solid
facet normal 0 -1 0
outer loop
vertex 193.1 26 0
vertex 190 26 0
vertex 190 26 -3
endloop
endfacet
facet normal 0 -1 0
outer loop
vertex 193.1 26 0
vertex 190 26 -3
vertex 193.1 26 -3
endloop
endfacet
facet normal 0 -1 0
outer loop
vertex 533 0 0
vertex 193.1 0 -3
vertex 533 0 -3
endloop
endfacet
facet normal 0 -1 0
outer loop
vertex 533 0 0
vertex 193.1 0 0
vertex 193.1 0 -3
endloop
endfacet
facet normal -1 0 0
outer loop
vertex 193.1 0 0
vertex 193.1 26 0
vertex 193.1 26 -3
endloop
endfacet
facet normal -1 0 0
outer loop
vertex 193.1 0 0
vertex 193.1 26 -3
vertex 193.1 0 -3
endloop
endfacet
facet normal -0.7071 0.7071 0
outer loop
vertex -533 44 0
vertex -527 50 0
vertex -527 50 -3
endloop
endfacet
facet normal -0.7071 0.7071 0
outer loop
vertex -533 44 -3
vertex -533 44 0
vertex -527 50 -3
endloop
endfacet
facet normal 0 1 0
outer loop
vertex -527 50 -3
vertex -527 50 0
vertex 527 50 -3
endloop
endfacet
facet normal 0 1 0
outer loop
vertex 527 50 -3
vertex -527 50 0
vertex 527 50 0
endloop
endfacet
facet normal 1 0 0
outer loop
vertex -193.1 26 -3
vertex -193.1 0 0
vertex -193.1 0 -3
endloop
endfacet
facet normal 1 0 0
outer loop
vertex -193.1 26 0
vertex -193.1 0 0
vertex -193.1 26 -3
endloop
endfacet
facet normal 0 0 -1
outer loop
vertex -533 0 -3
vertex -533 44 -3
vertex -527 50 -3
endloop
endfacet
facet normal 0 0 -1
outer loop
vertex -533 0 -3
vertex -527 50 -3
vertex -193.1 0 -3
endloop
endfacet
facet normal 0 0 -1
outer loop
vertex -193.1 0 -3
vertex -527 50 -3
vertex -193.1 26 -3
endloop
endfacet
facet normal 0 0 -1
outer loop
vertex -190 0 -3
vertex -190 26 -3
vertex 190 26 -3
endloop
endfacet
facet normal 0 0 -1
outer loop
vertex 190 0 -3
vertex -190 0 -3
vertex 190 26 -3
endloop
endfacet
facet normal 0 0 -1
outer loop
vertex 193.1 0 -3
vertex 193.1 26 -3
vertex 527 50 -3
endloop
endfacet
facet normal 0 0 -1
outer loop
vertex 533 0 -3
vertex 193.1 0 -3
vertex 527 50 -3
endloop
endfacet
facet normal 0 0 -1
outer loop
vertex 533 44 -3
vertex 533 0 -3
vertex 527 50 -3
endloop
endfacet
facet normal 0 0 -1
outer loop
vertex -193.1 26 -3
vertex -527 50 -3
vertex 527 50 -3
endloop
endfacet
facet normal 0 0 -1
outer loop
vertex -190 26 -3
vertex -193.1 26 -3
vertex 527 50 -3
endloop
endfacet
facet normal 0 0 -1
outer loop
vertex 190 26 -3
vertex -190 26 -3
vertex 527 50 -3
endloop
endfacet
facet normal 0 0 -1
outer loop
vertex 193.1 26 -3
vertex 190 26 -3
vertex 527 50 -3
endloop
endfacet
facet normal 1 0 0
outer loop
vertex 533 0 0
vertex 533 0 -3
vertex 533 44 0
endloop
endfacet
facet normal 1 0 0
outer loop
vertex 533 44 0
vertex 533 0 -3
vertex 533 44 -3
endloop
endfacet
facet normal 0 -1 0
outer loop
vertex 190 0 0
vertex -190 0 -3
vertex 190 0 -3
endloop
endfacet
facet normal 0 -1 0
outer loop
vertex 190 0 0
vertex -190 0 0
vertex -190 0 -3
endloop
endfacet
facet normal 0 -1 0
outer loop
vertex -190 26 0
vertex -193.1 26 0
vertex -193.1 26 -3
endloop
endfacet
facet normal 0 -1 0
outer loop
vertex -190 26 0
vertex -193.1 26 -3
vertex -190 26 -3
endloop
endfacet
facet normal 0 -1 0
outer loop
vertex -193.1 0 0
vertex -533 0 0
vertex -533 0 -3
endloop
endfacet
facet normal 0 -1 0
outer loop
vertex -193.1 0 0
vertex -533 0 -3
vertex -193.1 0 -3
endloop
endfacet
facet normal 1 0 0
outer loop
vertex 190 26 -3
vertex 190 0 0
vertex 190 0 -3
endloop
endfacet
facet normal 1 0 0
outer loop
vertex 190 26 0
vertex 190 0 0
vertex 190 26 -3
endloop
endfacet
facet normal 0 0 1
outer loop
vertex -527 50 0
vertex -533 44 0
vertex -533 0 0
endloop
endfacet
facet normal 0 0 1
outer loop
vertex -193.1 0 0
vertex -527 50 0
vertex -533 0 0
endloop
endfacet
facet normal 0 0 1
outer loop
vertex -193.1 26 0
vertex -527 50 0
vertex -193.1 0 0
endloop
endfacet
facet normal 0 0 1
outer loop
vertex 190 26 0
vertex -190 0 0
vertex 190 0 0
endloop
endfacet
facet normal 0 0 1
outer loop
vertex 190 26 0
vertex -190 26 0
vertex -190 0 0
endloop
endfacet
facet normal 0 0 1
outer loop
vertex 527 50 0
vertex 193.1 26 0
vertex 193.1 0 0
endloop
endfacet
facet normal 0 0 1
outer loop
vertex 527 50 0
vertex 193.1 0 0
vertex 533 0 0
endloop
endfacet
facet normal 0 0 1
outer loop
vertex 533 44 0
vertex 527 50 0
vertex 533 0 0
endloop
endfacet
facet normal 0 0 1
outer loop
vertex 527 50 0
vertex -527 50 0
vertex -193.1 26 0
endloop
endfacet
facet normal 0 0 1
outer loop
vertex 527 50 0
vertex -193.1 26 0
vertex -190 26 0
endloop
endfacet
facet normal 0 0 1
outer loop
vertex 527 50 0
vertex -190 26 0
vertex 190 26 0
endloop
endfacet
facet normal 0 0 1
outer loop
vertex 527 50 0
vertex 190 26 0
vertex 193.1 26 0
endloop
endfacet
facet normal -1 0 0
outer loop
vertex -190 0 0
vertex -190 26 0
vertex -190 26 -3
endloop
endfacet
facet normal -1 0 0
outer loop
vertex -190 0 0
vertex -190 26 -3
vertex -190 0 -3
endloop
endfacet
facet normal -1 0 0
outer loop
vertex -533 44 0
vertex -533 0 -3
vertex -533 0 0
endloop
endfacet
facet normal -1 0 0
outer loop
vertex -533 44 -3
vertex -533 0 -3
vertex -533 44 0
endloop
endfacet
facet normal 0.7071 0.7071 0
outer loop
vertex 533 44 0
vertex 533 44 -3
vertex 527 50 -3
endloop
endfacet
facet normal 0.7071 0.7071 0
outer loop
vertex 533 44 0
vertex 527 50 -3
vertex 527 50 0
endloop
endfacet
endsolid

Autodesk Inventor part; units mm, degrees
ref_plane "YZ Plane" through (0, 0, 0) normal (1, 0, 0) x (0, 1, 0)
ref_plane "XZ Plane" through (0, 0, 0) normal (0, 1, 0) x (-1, 0, 0)
ref_plane "XY Plane" through (0, 0, 0) normal (0, 0, 1) x (1, 0, 0)
sketch "Sketch1" plane through (0, 0, 0) normal (0, 0, 1) x (1, 0, 0)
  line L0 (-600, 0) -> (600, 0)
  line L1 (-600, 0) -> (-600, 50)
  line L2 (-600, 50) -> (600, 50)
  line L3 (600, 50) -> (600, 0)
  circle A0 centre (-600, 0) radius 25
  circle A1 centre (600, 0) radius 25
  line L4 (600, 0) -> (644.2345, 16.1001)
  line L5 (644.2345, 16.1001) -> (635, 50)
  line L6 (635, 50) -> (600, 50)
  point P0 (0, 0)
  point P1 (0, 0)
  point P2 (-600, 25)
  point P3 (-575, 0)
  point P4 (575, 0)
  point P5 (600, 25)
  point P6 (623.4923, 8.5505)
  dimension "d18" = 50
  dimension "d19" = 1200
  dimension "d25" = 50
  dimension "d26" = 50
  dimension "d39" = 70
  dimension "d40" = 35
extrude "Plate2" add sketch "Sketch1" against normal blind 3 contours L1 A0 L0 | A0 L1 L2 L3 A1 L0 | A1 L3 L0 picked at (-598.1457, 16.4577)
sketch "Sketch3" plane through (0, 0, 0) normal (0, 0, 1) x (1, 0, 0)
  line L0 (-191.55, 0) -> (-191.55, 50) construction
  line L1 (600, 50) -> (-600, 50) construction
  line L2 (-600, 50) -> (-600, 0) projected
  line L3 (-193.1, 26) -> (-190, 26)
  line L4 (-190, 26) -> (-190, 0)
  line L5 (-190, 0) -> (-193.1, 0)
  line L6 (-193.1, 0) -> (-193.1, 26)
  line L7 (-600, 0) -> (600, 0) projected
  line L8 (191.55, 50) -> (191.55, 0) construction
  line L9 (190, 26) -> (193.1, 26)
  line L10 (193.1, 26) -> (193.1, 0)
  line L11 (193.1, 0) -> (190, 0)
  line L12 (190, 0) -> (190, 26)
  line L13 (0, 0) -> (0, 50) construction
  point P0 (0, 0)
  point P1 (190, 0)
  point P2 (193.1, 0)
  dimension "d28" = 3.1
  dimension "d29" = 26
  dimension "d52" = 380
extrude "Extrusion2" cut sketch "Sketch3" against normal through all
sketch "Sketch4" plane through (0, 0, -3) normal (0, 0, -1) x (-1, 0, 0)
  line L0 (190, 0) -> (190, 26) projected
  line L1 (190, 26) -> (193.1, 26) projected
  line L2 (193.1, 26) -> (193.1, 0) projected
  line L3 (600, 0) -> (193.1, 0) projected
  line L4 (600, 50) -> (600, 0) projected
  line L5 (-600, 50) -> (600, 50) projected
  line L6 (-600, 0) -> (-600, 50) projected
  line L7 (-193.1, 0) -> (-600, 0) projected
  line L8 (-193.1, 0) -> (-193.1, 26) projected
  line L9 (-193.1, 26) -> (-190, 26) projected
  line L10 (-190, 26) -> (-190, 0) projected
  line L11 (190, 0) -> (-190, 0) projected
  line L12 (-533, 0) -> (-533, 50)
  line L13 (-600, 50) -> (600, 50) projected
  line L14 (600, 0) -> (193.1, 0) projected
  line L15 (533, 0) -> (533, 50)
  point P0 (0, 0)
  point P1 (533, 0)
  dimension "d45" = 67
  dimension "d46" = 67
extrude "Extrusion3" cut sketch "Sketch4" against normal through all contours L15 L5 L4 L3 | L7 L6 L5 L12
sketch "Sketch5" plane through (0, 0, 0) normal (0, 0, 1) x (1, 0, 0)
  line L0 (-55.7541, 0.5014) -> (-55.7541, 31.0924) construction
  line L1 (-55.7541, 31.0924) -> (66.2742, 31.0924) construction
  line L2 (66.2742, 31.0924) -> (66.2742, 0.5014) construction
  line L3 (66.2742, 0.5014) -> (-55.7541, 0.5014) construction
  line L4 (533, 50) -> (-533, 50) projected
  line L5 (-533, 50) -> (-533, 0) projected
  point P0 (0, 0)
mark "Mark1"
chamfer "Corner Chamfer1" distance 6 angle 45 2 edges at (-533, 50, -1.5) (533, 50, -1.5)
equation "\"d46\" = d45"
equation "\"d20\" = Thickness"
equation "\"BendReliefWidth\" = Thickness"
equation "\"BendReliefDepth\" = 0.5 * Thickness"
equation "\"CornerReliefSize\" = 4 * Thickness"
equation "\"MinimumRemnant\" = 2 * Thickness"
equation "\"TransitionRadius\" = BendRadius"
equation "\"JacobiRadiusSize\" = BendRadius"
equation "\"GapSize\" = Thickness"
equation "\"Thickness\" = 3"
equation "\"BendRadius\" = 5"
properties part number "MSC 106 RIB CONE" material "Stainless Steel"
